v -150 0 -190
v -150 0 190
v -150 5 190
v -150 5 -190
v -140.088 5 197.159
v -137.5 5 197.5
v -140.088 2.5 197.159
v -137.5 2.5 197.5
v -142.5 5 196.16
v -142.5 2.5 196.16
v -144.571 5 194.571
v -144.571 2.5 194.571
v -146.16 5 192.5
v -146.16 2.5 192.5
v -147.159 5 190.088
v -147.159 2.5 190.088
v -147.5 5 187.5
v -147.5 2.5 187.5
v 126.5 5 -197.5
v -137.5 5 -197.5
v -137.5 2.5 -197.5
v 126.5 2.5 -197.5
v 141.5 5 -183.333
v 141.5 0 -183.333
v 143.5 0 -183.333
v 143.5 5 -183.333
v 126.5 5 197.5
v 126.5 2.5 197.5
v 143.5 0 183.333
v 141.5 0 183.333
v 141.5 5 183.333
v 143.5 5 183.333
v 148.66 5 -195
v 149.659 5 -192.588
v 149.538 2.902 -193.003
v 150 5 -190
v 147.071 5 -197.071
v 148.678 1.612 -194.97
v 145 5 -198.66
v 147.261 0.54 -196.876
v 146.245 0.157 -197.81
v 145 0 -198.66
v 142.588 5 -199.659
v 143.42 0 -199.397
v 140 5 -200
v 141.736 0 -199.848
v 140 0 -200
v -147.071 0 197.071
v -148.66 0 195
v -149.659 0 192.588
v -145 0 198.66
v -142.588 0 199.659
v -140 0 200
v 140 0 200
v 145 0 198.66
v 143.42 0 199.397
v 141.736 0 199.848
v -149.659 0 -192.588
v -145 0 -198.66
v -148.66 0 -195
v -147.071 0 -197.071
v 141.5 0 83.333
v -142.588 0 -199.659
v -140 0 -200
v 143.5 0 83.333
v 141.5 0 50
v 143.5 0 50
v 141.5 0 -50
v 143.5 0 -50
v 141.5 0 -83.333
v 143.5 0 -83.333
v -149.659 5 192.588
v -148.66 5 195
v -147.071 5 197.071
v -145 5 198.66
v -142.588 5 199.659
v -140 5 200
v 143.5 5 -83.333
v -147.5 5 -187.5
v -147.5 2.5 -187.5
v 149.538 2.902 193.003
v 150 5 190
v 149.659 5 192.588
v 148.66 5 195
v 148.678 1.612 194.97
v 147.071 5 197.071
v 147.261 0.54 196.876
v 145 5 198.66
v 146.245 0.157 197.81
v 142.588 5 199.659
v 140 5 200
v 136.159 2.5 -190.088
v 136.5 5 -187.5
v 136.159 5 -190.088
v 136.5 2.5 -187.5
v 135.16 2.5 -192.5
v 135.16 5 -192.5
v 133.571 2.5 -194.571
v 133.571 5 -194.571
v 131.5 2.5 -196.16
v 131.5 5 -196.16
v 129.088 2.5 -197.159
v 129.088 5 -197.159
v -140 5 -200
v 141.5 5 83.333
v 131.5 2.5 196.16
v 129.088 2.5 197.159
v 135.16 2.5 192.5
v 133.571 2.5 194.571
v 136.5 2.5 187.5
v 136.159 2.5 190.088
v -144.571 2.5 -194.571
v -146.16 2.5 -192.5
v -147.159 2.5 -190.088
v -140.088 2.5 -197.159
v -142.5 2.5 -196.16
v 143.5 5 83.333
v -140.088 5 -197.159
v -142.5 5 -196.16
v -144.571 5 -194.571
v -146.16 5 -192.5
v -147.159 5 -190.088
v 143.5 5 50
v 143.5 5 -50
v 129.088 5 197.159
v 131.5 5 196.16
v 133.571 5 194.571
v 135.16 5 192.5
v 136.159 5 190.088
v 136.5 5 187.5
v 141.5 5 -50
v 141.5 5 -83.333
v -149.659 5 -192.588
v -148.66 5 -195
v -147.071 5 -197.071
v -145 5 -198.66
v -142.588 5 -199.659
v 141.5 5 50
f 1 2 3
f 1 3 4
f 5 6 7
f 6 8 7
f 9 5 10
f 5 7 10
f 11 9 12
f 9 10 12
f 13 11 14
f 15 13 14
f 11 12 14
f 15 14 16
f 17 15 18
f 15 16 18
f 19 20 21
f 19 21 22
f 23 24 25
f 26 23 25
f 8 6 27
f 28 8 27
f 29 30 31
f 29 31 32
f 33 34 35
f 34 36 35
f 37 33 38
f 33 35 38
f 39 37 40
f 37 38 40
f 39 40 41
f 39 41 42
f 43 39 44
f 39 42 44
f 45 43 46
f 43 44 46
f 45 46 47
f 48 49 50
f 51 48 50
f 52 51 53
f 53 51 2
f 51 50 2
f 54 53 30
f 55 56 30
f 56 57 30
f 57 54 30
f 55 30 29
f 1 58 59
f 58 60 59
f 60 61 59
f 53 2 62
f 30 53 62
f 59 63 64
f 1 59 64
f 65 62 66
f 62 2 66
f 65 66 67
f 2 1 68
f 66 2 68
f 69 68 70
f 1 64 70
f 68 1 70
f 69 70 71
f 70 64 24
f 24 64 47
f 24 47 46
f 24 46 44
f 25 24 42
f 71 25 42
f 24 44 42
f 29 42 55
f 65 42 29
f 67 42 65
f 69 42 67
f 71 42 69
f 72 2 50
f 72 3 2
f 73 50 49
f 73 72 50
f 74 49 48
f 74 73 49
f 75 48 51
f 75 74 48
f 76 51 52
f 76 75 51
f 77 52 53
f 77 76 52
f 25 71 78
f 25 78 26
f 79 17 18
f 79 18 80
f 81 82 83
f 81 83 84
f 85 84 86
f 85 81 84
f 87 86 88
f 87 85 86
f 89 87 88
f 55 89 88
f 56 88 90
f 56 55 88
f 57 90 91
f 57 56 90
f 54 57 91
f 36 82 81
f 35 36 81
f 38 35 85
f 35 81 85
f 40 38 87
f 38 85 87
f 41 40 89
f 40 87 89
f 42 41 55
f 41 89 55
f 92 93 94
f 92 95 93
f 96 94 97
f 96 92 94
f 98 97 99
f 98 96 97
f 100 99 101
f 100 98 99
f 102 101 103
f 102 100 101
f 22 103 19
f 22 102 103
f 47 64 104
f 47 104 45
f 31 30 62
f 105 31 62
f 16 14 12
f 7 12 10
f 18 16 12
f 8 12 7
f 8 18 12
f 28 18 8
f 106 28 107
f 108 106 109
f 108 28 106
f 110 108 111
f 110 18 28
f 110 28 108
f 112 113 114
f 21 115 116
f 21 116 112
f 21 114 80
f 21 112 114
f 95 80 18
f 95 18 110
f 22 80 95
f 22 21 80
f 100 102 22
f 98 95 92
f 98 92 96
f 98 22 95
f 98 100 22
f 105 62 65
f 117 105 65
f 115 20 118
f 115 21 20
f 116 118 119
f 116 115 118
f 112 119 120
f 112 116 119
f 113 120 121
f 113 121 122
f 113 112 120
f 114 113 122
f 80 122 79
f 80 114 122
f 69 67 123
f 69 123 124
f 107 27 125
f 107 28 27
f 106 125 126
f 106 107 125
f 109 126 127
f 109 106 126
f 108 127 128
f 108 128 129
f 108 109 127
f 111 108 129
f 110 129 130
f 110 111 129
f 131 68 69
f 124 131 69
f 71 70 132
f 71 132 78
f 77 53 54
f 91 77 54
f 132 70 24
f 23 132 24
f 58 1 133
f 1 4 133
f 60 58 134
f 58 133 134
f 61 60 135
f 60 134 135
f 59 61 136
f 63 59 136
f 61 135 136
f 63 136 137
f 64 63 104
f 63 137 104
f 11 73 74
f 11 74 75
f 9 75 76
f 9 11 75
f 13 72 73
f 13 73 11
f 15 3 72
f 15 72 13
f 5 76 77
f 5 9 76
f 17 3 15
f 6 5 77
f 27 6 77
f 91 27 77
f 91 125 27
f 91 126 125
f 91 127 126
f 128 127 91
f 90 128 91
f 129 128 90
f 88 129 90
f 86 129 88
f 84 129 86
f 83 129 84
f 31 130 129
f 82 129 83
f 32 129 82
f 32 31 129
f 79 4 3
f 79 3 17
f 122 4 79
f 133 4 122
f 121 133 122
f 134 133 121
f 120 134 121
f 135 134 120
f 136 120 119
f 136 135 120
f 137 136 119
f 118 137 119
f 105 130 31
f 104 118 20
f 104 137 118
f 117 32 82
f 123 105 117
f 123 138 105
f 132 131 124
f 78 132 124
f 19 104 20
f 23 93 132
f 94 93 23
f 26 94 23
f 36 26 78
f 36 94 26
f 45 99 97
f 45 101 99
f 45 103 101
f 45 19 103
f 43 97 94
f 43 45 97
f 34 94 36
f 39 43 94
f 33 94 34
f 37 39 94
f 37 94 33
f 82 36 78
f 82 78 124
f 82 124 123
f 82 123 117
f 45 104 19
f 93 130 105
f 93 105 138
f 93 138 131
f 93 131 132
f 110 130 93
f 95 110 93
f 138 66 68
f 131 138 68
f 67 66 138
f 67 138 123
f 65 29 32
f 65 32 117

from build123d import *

# Parameters (mm, degrees)
SKETCH1_W               = 300
SKETCH1_H               = 400
BOSS_EXTRUDE1_DEPTH     = 5
CUT_EXTRUDE2_DEPTH      = 400
CUT_EXTRUDE3_DEPTH      = 251.049995001
CUT_EXTRUDE3_DEPTH_BACK = 251.049995001
SKETCH7_W               = 2
SKETCH7_H               = 100
SKETCH8_W               = 284
SKETCH8_H               = 395
CUT_EXTRUDE4_DEPTH      = 2.5
FILLET1_R               = 10
CUT_EXTRUDE5_DEPTH      = 251.049995001
CUT_EXTRUDE5_DEPTH_BACK = 251.049995001


with BuildPart() as part:
    # Sketch1 → Boss-Extrude1 (new body)
    with BuildSketch(Plane(origin=(0, 0, 0), x_dir=(1, 0, 0), z_dir=(0, 1, 0))):
        Rectangle(SKETCH1_W, SKETCH1_H)
    extrude(amount=BOSS_EXTRUDE1_DEPTH)

    # Sketch6 → Cut-Extrude2 (cut)
    with BuildSketch(Plane.XY.offset(200)):
        with BuildLine():
            Line((145, 0), (150, 0))
            Line((150, 0), (150, 5))
            ThreePointArc((150, 5), (148.535533906, 1.464466094), (145, 0))
        make_face()
    extrude(amount=-CUT_EXTRUDE2_DEPTH, mode=Mode.SUBTRACT)

    # Sketch7 → Cut-Extrude3 (cut, two sides: drawn at the far end of the back side and taken through both)
    with BuildSketch(Plane(origin=(0, 5, 0), x_dir=(1, 0, 0), z_dir=(0, 1, 0)).offset(-CUT_EXTRUDE3_DEPTH_BACK)):
        with Locations((142.5, 0)):
            Rectangle(SKETCH7_W, SKETCH7_H)
        with Locations((142.5, 133.333333333)):
            Rectangle(SKETCH7_W, SKETCH7_H)
        with Locations((142.5, -133.333333333)):
            Rectangle(SKETCH7_W, SKETCH7_H)
    extrude(amount=CUT_EXTRUDE3_DEPTH + CUT_EXTRUDE3_DEPTH_BACK, mode=Mode.SUBTRACT)

    # Sketch8 → Cut-Extrude4 (cut)
    with BuildSketch(Plane(origin=(0, 5, 0), x_dir=(1, 0, 0), z_dir=(0, 1, 0))):
        with Locations((-5.5, 0)):
            Rectangle(SKETCH8_W, SKETCH8_H)
    extrude(amount=-CUT_EXTRUDE4_DEPTH, mode=Mode.SUBTRACT)

    # Fillet1
    fillet1_edges = [part.edges().sort_by_distance(p)[0] for p in [
        (-150, 2.5, 200),
        (-150, 2.5, -200),
        (136.5, 3.75, -197.5),
        (136.5, 3.75, 197.5),
        (-147.5, 3.75, 197.5),
        (-147.5, 3.75, -197.5),
    ]]
    fillet(fillet1_edges, radius=FILLET1_R)

    # Sketch9 → Cut-Extrude5 (cut, two sides: drawn at the far end of the back side and taken through both)
    with BuildSketch(Plane(origin=(0, 5, 0), x_dir=(1, 0, 0), z_dir=(0, 1, 0)).offset(-CUT_EXTRUDE5_DEPTH_BACK)):
        with BuildLine():
            Line((140, 200), (150, 200))
            Line((150, 200), (150, 190))
            ThreePointArc((150, 190), (147.071067812, 197.071067812), (140, 200))
        make_face()
        with BuildLine():
            Line((150, -200), (150, -190))
            ThreePointArc((150, -190), (147.071067812, -197.071067812), (140, -200))
            Line((140, -200), (150, -200))
        make_face()
    extrude(amount=CUT_EXTRUDE5_DEPTH + CUT_EXTRUDE5_DEPTH_BACK, mode=Mode.SUBTRACT)


solid = part.part
